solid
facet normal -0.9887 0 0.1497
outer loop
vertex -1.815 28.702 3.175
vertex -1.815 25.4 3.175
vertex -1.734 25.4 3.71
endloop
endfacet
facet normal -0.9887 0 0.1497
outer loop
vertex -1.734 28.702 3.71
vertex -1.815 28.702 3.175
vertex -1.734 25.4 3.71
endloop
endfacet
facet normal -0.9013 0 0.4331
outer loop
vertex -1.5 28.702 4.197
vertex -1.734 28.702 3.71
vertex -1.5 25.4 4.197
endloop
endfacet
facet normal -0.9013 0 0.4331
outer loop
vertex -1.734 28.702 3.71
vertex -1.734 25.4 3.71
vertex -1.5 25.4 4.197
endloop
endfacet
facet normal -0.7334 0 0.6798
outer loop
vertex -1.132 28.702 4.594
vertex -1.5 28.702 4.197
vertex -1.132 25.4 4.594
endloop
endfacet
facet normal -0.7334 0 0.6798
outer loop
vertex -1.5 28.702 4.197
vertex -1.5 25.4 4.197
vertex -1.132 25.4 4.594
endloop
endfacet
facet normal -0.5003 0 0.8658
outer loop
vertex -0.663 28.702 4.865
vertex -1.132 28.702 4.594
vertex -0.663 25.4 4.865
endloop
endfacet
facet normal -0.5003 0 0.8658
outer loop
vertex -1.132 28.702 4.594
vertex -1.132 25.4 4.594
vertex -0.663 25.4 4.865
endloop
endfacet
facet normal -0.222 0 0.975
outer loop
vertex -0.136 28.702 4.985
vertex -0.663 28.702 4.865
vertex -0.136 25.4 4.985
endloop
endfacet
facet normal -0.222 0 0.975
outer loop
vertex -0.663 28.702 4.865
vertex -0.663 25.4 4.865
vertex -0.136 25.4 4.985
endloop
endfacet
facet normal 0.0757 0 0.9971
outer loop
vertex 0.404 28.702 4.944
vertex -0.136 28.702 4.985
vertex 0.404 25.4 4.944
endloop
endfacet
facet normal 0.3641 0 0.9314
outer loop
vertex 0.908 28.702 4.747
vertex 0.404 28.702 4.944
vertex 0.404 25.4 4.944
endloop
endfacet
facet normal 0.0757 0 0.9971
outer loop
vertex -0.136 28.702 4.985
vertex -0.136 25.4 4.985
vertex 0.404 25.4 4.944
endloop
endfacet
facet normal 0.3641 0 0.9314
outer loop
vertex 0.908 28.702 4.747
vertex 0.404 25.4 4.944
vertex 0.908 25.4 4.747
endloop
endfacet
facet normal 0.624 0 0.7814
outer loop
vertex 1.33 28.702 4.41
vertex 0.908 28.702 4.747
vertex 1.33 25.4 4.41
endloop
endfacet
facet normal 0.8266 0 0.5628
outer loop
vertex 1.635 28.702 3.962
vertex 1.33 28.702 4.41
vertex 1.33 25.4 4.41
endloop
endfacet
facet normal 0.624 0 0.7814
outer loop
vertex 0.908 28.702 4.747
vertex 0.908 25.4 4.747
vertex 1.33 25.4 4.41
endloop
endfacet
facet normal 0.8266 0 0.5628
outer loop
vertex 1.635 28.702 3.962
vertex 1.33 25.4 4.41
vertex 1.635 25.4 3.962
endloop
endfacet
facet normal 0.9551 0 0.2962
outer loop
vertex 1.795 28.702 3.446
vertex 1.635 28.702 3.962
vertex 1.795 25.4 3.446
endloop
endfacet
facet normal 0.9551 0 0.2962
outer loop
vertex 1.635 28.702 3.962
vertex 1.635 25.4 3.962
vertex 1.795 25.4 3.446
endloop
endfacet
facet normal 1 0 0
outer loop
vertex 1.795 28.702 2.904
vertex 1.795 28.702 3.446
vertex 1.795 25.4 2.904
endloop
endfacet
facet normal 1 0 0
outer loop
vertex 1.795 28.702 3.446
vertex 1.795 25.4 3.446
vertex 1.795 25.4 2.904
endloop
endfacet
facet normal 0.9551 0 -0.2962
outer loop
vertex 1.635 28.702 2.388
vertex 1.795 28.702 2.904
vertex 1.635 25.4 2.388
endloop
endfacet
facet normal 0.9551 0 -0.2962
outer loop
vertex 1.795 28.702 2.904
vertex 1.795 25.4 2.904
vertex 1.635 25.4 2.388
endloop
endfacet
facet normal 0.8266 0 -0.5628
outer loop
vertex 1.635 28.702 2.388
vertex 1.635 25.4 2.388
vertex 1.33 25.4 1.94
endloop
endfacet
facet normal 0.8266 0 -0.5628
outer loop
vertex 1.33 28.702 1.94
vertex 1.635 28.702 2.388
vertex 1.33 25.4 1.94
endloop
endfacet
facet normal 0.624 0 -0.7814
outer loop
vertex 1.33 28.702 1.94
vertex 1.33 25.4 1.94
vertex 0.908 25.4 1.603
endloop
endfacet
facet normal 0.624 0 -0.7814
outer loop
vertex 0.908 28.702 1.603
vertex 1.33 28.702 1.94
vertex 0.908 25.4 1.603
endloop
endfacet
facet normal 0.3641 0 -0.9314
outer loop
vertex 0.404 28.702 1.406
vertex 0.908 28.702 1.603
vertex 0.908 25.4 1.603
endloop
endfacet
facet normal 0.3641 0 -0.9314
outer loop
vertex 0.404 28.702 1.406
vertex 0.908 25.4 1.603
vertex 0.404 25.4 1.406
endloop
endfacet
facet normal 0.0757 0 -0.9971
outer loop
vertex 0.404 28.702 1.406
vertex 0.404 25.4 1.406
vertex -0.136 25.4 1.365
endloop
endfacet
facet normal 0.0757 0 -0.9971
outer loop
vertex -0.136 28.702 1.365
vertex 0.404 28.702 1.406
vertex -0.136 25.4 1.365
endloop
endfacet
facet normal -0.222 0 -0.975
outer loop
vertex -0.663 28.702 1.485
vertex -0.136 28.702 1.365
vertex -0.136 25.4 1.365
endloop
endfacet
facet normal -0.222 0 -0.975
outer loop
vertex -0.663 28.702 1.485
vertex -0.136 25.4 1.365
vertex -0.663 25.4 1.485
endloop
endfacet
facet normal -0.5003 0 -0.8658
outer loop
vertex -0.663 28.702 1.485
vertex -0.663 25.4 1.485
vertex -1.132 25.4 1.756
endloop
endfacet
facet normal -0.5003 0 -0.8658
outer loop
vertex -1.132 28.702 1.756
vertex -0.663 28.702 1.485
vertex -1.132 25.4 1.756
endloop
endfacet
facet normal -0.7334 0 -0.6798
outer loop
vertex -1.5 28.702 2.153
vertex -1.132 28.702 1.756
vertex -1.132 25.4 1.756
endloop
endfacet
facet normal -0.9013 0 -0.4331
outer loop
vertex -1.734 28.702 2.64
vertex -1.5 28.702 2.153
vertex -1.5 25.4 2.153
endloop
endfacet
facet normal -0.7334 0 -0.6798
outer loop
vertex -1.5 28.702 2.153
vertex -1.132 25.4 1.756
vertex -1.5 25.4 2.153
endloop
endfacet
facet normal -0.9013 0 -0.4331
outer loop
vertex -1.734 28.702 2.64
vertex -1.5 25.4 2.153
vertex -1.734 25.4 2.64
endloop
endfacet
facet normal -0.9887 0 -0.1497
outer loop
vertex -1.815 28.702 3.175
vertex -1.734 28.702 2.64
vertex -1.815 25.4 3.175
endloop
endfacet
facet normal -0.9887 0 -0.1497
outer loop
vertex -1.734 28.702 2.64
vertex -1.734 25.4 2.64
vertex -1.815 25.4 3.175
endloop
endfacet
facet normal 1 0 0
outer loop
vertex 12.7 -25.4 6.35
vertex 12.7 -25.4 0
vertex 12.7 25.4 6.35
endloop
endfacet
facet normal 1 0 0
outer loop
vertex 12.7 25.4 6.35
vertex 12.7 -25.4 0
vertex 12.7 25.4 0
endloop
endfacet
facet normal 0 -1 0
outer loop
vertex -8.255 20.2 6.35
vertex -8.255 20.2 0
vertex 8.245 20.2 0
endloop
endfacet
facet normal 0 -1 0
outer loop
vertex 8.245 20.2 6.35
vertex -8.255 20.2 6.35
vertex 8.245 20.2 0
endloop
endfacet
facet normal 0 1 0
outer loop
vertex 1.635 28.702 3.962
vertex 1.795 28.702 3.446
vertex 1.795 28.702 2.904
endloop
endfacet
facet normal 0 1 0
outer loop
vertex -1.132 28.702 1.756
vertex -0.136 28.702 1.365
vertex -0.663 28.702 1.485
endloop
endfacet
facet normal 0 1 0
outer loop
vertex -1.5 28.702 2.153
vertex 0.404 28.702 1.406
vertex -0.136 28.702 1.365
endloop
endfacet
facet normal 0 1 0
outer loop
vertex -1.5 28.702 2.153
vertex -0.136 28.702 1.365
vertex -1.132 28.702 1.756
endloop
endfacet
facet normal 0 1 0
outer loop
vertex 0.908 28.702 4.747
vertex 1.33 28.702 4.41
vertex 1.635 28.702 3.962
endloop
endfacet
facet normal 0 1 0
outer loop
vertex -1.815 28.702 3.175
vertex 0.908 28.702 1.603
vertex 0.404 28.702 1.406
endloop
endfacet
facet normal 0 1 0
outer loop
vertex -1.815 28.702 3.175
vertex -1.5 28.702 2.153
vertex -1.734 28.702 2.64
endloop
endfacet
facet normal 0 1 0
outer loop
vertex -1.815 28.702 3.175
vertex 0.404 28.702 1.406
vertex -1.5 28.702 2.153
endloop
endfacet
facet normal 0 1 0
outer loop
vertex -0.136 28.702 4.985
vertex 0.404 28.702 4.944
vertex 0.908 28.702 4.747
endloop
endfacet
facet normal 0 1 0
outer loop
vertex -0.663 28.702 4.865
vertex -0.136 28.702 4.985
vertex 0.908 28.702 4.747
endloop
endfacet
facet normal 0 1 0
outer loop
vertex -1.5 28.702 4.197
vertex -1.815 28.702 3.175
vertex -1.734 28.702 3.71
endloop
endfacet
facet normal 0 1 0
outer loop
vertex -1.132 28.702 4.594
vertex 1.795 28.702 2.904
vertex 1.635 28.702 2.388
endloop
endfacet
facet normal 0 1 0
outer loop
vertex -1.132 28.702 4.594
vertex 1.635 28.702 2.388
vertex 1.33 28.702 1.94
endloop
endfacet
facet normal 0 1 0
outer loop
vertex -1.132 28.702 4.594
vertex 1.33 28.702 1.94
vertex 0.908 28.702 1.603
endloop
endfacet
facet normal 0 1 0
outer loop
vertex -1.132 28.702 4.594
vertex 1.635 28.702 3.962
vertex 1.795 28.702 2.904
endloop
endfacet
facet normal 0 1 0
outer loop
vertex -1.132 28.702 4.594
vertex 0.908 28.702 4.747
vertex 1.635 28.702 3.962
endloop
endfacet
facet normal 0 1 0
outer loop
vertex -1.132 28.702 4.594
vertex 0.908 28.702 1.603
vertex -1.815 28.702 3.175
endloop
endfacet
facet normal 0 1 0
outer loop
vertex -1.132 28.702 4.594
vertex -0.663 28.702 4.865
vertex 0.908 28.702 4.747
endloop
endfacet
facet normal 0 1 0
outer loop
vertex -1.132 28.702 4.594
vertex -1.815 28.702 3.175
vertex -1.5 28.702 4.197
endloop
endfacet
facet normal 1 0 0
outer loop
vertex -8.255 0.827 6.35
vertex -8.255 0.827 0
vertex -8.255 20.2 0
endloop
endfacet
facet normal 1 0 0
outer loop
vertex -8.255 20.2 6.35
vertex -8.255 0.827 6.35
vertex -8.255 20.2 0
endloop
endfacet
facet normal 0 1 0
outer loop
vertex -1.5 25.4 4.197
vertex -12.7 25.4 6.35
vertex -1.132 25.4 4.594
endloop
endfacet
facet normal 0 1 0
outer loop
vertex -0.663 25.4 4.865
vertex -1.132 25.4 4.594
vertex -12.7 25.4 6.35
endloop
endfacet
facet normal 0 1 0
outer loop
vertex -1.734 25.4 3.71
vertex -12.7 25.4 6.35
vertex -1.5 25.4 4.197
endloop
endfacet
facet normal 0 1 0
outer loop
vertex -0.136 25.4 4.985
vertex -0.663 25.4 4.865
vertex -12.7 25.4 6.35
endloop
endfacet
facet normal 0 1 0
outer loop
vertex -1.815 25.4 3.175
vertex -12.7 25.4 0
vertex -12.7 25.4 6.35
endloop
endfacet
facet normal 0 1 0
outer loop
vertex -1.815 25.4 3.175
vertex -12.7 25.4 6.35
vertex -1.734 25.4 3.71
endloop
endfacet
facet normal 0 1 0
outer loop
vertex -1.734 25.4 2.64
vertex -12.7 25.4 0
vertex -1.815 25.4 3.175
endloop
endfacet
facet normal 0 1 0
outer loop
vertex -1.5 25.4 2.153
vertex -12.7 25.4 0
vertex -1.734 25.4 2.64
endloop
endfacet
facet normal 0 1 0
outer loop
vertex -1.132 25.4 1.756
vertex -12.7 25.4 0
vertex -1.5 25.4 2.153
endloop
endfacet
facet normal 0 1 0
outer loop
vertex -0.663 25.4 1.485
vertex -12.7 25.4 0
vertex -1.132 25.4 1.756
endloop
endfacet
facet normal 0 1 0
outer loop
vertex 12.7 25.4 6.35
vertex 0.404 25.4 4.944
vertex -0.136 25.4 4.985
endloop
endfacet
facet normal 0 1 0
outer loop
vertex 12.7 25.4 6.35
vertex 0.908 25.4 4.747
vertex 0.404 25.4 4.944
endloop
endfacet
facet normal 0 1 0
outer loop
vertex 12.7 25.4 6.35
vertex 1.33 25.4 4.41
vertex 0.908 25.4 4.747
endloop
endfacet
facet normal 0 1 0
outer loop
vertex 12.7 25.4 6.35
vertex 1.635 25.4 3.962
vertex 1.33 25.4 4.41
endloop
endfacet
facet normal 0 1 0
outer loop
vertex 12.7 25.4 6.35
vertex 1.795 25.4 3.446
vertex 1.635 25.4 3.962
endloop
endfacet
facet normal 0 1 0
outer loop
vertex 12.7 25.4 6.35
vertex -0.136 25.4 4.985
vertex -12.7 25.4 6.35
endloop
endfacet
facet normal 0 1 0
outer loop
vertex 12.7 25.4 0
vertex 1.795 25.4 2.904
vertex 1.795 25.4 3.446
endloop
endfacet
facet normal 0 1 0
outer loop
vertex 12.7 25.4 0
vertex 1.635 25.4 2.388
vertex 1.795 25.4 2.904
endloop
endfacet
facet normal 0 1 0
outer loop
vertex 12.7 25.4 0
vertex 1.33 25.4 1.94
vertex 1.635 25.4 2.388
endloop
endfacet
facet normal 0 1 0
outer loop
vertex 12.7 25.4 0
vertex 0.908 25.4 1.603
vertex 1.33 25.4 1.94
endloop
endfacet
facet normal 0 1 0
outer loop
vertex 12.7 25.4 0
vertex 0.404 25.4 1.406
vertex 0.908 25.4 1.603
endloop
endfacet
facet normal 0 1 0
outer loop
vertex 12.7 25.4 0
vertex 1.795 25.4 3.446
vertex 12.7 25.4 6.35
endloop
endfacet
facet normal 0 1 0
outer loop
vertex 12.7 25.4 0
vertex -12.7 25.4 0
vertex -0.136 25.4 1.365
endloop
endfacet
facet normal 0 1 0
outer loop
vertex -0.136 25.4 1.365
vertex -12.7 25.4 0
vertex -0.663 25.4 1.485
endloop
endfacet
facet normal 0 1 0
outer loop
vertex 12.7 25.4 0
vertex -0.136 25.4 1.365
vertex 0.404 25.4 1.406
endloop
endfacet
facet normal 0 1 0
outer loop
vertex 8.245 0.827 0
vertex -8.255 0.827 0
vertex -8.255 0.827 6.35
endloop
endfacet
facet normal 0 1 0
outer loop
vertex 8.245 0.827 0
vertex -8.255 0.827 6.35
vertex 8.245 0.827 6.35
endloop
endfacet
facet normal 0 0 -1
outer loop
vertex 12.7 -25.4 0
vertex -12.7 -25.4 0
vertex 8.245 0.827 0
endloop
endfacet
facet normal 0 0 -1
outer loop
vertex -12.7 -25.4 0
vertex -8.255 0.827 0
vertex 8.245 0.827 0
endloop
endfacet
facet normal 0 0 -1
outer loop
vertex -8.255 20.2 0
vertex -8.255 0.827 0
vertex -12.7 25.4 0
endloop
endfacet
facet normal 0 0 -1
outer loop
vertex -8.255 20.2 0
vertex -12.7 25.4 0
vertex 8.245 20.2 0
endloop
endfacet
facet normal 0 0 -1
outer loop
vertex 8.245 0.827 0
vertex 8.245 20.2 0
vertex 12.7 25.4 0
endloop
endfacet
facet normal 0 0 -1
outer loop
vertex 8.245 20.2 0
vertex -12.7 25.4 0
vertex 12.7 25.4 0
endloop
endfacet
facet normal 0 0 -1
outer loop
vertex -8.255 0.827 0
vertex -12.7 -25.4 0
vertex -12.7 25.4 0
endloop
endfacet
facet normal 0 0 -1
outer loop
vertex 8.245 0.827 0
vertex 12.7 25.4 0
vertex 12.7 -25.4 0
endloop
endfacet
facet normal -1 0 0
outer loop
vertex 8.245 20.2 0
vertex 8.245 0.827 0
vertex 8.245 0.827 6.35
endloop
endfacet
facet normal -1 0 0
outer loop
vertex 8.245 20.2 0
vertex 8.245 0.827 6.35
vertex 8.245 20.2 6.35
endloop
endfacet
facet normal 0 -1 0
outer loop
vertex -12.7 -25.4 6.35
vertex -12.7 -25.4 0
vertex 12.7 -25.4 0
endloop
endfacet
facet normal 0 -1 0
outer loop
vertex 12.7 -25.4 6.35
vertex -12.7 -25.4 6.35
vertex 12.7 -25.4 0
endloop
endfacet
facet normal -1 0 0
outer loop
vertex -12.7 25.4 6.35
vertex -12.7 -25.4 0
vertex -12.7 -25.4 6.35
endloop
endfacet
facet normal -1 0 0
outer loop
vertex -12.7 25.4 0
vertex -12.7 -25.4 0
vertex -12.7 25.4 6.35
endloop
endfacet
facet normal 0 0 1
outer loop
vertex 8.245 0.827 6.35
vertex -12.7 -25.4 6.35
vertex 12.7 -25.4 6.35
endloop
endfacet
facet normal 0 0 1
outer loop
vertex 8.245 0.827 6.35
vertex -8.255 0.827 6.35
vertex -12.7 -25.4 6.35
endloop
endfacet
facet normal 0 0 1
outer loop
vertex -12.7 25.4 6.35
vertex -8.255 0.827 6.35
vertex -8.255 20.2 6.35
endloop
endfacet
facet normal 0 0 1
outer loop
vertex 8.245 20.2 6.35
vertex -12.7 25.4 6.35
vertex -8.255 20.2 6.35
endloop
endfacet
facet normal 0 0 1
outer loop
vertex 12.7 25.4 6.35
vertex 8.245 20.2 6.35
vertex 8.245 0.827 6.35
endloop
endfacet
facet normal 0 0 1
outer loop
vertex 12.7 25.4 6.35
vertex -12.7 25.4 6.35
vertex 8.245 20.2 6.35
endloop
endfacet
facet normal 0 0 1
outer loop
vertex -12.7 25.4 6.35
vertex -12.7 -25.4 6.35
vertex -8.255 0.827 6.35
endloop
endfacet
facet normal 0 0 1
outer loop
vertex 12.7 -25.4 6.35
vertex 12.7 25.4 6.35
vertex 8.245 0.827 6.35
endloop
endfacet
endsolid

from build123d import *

# Parameters (mm, degrees)
F0_W     = 25.4
F0_H     = 50.8
F0_W_2   = 16.5
F0_H_2   = 19.372893
F1_DEPTH = 6.35
F2_R     = 1.815
F3_DEPTH = 3.302


with BuildPart() as f1:
    # F0 (on Top) → F1 (new body)
    with BuildSketch(Plane.XY):
        Rectangle(F0_W, F0_H)
        with Locations((-0.005, 10.513554)):
            Rectangle(F0_W_2, F0_H_2, mode=Mode.SUBTRACT)
    extrude(amount=F1_DEPTH)

    # F2 (on face) → F3 (join)
    with BuildSketch(Plane(origin=(0, 25.4, 0), x_dir=(-1, 0, 0), z_dir=(0, 1, 0))):
        with Locations((0, 3.175)):
            Circle(F2_R)
    extrude(amount=F3_DEPTH)


solid = f1.part
